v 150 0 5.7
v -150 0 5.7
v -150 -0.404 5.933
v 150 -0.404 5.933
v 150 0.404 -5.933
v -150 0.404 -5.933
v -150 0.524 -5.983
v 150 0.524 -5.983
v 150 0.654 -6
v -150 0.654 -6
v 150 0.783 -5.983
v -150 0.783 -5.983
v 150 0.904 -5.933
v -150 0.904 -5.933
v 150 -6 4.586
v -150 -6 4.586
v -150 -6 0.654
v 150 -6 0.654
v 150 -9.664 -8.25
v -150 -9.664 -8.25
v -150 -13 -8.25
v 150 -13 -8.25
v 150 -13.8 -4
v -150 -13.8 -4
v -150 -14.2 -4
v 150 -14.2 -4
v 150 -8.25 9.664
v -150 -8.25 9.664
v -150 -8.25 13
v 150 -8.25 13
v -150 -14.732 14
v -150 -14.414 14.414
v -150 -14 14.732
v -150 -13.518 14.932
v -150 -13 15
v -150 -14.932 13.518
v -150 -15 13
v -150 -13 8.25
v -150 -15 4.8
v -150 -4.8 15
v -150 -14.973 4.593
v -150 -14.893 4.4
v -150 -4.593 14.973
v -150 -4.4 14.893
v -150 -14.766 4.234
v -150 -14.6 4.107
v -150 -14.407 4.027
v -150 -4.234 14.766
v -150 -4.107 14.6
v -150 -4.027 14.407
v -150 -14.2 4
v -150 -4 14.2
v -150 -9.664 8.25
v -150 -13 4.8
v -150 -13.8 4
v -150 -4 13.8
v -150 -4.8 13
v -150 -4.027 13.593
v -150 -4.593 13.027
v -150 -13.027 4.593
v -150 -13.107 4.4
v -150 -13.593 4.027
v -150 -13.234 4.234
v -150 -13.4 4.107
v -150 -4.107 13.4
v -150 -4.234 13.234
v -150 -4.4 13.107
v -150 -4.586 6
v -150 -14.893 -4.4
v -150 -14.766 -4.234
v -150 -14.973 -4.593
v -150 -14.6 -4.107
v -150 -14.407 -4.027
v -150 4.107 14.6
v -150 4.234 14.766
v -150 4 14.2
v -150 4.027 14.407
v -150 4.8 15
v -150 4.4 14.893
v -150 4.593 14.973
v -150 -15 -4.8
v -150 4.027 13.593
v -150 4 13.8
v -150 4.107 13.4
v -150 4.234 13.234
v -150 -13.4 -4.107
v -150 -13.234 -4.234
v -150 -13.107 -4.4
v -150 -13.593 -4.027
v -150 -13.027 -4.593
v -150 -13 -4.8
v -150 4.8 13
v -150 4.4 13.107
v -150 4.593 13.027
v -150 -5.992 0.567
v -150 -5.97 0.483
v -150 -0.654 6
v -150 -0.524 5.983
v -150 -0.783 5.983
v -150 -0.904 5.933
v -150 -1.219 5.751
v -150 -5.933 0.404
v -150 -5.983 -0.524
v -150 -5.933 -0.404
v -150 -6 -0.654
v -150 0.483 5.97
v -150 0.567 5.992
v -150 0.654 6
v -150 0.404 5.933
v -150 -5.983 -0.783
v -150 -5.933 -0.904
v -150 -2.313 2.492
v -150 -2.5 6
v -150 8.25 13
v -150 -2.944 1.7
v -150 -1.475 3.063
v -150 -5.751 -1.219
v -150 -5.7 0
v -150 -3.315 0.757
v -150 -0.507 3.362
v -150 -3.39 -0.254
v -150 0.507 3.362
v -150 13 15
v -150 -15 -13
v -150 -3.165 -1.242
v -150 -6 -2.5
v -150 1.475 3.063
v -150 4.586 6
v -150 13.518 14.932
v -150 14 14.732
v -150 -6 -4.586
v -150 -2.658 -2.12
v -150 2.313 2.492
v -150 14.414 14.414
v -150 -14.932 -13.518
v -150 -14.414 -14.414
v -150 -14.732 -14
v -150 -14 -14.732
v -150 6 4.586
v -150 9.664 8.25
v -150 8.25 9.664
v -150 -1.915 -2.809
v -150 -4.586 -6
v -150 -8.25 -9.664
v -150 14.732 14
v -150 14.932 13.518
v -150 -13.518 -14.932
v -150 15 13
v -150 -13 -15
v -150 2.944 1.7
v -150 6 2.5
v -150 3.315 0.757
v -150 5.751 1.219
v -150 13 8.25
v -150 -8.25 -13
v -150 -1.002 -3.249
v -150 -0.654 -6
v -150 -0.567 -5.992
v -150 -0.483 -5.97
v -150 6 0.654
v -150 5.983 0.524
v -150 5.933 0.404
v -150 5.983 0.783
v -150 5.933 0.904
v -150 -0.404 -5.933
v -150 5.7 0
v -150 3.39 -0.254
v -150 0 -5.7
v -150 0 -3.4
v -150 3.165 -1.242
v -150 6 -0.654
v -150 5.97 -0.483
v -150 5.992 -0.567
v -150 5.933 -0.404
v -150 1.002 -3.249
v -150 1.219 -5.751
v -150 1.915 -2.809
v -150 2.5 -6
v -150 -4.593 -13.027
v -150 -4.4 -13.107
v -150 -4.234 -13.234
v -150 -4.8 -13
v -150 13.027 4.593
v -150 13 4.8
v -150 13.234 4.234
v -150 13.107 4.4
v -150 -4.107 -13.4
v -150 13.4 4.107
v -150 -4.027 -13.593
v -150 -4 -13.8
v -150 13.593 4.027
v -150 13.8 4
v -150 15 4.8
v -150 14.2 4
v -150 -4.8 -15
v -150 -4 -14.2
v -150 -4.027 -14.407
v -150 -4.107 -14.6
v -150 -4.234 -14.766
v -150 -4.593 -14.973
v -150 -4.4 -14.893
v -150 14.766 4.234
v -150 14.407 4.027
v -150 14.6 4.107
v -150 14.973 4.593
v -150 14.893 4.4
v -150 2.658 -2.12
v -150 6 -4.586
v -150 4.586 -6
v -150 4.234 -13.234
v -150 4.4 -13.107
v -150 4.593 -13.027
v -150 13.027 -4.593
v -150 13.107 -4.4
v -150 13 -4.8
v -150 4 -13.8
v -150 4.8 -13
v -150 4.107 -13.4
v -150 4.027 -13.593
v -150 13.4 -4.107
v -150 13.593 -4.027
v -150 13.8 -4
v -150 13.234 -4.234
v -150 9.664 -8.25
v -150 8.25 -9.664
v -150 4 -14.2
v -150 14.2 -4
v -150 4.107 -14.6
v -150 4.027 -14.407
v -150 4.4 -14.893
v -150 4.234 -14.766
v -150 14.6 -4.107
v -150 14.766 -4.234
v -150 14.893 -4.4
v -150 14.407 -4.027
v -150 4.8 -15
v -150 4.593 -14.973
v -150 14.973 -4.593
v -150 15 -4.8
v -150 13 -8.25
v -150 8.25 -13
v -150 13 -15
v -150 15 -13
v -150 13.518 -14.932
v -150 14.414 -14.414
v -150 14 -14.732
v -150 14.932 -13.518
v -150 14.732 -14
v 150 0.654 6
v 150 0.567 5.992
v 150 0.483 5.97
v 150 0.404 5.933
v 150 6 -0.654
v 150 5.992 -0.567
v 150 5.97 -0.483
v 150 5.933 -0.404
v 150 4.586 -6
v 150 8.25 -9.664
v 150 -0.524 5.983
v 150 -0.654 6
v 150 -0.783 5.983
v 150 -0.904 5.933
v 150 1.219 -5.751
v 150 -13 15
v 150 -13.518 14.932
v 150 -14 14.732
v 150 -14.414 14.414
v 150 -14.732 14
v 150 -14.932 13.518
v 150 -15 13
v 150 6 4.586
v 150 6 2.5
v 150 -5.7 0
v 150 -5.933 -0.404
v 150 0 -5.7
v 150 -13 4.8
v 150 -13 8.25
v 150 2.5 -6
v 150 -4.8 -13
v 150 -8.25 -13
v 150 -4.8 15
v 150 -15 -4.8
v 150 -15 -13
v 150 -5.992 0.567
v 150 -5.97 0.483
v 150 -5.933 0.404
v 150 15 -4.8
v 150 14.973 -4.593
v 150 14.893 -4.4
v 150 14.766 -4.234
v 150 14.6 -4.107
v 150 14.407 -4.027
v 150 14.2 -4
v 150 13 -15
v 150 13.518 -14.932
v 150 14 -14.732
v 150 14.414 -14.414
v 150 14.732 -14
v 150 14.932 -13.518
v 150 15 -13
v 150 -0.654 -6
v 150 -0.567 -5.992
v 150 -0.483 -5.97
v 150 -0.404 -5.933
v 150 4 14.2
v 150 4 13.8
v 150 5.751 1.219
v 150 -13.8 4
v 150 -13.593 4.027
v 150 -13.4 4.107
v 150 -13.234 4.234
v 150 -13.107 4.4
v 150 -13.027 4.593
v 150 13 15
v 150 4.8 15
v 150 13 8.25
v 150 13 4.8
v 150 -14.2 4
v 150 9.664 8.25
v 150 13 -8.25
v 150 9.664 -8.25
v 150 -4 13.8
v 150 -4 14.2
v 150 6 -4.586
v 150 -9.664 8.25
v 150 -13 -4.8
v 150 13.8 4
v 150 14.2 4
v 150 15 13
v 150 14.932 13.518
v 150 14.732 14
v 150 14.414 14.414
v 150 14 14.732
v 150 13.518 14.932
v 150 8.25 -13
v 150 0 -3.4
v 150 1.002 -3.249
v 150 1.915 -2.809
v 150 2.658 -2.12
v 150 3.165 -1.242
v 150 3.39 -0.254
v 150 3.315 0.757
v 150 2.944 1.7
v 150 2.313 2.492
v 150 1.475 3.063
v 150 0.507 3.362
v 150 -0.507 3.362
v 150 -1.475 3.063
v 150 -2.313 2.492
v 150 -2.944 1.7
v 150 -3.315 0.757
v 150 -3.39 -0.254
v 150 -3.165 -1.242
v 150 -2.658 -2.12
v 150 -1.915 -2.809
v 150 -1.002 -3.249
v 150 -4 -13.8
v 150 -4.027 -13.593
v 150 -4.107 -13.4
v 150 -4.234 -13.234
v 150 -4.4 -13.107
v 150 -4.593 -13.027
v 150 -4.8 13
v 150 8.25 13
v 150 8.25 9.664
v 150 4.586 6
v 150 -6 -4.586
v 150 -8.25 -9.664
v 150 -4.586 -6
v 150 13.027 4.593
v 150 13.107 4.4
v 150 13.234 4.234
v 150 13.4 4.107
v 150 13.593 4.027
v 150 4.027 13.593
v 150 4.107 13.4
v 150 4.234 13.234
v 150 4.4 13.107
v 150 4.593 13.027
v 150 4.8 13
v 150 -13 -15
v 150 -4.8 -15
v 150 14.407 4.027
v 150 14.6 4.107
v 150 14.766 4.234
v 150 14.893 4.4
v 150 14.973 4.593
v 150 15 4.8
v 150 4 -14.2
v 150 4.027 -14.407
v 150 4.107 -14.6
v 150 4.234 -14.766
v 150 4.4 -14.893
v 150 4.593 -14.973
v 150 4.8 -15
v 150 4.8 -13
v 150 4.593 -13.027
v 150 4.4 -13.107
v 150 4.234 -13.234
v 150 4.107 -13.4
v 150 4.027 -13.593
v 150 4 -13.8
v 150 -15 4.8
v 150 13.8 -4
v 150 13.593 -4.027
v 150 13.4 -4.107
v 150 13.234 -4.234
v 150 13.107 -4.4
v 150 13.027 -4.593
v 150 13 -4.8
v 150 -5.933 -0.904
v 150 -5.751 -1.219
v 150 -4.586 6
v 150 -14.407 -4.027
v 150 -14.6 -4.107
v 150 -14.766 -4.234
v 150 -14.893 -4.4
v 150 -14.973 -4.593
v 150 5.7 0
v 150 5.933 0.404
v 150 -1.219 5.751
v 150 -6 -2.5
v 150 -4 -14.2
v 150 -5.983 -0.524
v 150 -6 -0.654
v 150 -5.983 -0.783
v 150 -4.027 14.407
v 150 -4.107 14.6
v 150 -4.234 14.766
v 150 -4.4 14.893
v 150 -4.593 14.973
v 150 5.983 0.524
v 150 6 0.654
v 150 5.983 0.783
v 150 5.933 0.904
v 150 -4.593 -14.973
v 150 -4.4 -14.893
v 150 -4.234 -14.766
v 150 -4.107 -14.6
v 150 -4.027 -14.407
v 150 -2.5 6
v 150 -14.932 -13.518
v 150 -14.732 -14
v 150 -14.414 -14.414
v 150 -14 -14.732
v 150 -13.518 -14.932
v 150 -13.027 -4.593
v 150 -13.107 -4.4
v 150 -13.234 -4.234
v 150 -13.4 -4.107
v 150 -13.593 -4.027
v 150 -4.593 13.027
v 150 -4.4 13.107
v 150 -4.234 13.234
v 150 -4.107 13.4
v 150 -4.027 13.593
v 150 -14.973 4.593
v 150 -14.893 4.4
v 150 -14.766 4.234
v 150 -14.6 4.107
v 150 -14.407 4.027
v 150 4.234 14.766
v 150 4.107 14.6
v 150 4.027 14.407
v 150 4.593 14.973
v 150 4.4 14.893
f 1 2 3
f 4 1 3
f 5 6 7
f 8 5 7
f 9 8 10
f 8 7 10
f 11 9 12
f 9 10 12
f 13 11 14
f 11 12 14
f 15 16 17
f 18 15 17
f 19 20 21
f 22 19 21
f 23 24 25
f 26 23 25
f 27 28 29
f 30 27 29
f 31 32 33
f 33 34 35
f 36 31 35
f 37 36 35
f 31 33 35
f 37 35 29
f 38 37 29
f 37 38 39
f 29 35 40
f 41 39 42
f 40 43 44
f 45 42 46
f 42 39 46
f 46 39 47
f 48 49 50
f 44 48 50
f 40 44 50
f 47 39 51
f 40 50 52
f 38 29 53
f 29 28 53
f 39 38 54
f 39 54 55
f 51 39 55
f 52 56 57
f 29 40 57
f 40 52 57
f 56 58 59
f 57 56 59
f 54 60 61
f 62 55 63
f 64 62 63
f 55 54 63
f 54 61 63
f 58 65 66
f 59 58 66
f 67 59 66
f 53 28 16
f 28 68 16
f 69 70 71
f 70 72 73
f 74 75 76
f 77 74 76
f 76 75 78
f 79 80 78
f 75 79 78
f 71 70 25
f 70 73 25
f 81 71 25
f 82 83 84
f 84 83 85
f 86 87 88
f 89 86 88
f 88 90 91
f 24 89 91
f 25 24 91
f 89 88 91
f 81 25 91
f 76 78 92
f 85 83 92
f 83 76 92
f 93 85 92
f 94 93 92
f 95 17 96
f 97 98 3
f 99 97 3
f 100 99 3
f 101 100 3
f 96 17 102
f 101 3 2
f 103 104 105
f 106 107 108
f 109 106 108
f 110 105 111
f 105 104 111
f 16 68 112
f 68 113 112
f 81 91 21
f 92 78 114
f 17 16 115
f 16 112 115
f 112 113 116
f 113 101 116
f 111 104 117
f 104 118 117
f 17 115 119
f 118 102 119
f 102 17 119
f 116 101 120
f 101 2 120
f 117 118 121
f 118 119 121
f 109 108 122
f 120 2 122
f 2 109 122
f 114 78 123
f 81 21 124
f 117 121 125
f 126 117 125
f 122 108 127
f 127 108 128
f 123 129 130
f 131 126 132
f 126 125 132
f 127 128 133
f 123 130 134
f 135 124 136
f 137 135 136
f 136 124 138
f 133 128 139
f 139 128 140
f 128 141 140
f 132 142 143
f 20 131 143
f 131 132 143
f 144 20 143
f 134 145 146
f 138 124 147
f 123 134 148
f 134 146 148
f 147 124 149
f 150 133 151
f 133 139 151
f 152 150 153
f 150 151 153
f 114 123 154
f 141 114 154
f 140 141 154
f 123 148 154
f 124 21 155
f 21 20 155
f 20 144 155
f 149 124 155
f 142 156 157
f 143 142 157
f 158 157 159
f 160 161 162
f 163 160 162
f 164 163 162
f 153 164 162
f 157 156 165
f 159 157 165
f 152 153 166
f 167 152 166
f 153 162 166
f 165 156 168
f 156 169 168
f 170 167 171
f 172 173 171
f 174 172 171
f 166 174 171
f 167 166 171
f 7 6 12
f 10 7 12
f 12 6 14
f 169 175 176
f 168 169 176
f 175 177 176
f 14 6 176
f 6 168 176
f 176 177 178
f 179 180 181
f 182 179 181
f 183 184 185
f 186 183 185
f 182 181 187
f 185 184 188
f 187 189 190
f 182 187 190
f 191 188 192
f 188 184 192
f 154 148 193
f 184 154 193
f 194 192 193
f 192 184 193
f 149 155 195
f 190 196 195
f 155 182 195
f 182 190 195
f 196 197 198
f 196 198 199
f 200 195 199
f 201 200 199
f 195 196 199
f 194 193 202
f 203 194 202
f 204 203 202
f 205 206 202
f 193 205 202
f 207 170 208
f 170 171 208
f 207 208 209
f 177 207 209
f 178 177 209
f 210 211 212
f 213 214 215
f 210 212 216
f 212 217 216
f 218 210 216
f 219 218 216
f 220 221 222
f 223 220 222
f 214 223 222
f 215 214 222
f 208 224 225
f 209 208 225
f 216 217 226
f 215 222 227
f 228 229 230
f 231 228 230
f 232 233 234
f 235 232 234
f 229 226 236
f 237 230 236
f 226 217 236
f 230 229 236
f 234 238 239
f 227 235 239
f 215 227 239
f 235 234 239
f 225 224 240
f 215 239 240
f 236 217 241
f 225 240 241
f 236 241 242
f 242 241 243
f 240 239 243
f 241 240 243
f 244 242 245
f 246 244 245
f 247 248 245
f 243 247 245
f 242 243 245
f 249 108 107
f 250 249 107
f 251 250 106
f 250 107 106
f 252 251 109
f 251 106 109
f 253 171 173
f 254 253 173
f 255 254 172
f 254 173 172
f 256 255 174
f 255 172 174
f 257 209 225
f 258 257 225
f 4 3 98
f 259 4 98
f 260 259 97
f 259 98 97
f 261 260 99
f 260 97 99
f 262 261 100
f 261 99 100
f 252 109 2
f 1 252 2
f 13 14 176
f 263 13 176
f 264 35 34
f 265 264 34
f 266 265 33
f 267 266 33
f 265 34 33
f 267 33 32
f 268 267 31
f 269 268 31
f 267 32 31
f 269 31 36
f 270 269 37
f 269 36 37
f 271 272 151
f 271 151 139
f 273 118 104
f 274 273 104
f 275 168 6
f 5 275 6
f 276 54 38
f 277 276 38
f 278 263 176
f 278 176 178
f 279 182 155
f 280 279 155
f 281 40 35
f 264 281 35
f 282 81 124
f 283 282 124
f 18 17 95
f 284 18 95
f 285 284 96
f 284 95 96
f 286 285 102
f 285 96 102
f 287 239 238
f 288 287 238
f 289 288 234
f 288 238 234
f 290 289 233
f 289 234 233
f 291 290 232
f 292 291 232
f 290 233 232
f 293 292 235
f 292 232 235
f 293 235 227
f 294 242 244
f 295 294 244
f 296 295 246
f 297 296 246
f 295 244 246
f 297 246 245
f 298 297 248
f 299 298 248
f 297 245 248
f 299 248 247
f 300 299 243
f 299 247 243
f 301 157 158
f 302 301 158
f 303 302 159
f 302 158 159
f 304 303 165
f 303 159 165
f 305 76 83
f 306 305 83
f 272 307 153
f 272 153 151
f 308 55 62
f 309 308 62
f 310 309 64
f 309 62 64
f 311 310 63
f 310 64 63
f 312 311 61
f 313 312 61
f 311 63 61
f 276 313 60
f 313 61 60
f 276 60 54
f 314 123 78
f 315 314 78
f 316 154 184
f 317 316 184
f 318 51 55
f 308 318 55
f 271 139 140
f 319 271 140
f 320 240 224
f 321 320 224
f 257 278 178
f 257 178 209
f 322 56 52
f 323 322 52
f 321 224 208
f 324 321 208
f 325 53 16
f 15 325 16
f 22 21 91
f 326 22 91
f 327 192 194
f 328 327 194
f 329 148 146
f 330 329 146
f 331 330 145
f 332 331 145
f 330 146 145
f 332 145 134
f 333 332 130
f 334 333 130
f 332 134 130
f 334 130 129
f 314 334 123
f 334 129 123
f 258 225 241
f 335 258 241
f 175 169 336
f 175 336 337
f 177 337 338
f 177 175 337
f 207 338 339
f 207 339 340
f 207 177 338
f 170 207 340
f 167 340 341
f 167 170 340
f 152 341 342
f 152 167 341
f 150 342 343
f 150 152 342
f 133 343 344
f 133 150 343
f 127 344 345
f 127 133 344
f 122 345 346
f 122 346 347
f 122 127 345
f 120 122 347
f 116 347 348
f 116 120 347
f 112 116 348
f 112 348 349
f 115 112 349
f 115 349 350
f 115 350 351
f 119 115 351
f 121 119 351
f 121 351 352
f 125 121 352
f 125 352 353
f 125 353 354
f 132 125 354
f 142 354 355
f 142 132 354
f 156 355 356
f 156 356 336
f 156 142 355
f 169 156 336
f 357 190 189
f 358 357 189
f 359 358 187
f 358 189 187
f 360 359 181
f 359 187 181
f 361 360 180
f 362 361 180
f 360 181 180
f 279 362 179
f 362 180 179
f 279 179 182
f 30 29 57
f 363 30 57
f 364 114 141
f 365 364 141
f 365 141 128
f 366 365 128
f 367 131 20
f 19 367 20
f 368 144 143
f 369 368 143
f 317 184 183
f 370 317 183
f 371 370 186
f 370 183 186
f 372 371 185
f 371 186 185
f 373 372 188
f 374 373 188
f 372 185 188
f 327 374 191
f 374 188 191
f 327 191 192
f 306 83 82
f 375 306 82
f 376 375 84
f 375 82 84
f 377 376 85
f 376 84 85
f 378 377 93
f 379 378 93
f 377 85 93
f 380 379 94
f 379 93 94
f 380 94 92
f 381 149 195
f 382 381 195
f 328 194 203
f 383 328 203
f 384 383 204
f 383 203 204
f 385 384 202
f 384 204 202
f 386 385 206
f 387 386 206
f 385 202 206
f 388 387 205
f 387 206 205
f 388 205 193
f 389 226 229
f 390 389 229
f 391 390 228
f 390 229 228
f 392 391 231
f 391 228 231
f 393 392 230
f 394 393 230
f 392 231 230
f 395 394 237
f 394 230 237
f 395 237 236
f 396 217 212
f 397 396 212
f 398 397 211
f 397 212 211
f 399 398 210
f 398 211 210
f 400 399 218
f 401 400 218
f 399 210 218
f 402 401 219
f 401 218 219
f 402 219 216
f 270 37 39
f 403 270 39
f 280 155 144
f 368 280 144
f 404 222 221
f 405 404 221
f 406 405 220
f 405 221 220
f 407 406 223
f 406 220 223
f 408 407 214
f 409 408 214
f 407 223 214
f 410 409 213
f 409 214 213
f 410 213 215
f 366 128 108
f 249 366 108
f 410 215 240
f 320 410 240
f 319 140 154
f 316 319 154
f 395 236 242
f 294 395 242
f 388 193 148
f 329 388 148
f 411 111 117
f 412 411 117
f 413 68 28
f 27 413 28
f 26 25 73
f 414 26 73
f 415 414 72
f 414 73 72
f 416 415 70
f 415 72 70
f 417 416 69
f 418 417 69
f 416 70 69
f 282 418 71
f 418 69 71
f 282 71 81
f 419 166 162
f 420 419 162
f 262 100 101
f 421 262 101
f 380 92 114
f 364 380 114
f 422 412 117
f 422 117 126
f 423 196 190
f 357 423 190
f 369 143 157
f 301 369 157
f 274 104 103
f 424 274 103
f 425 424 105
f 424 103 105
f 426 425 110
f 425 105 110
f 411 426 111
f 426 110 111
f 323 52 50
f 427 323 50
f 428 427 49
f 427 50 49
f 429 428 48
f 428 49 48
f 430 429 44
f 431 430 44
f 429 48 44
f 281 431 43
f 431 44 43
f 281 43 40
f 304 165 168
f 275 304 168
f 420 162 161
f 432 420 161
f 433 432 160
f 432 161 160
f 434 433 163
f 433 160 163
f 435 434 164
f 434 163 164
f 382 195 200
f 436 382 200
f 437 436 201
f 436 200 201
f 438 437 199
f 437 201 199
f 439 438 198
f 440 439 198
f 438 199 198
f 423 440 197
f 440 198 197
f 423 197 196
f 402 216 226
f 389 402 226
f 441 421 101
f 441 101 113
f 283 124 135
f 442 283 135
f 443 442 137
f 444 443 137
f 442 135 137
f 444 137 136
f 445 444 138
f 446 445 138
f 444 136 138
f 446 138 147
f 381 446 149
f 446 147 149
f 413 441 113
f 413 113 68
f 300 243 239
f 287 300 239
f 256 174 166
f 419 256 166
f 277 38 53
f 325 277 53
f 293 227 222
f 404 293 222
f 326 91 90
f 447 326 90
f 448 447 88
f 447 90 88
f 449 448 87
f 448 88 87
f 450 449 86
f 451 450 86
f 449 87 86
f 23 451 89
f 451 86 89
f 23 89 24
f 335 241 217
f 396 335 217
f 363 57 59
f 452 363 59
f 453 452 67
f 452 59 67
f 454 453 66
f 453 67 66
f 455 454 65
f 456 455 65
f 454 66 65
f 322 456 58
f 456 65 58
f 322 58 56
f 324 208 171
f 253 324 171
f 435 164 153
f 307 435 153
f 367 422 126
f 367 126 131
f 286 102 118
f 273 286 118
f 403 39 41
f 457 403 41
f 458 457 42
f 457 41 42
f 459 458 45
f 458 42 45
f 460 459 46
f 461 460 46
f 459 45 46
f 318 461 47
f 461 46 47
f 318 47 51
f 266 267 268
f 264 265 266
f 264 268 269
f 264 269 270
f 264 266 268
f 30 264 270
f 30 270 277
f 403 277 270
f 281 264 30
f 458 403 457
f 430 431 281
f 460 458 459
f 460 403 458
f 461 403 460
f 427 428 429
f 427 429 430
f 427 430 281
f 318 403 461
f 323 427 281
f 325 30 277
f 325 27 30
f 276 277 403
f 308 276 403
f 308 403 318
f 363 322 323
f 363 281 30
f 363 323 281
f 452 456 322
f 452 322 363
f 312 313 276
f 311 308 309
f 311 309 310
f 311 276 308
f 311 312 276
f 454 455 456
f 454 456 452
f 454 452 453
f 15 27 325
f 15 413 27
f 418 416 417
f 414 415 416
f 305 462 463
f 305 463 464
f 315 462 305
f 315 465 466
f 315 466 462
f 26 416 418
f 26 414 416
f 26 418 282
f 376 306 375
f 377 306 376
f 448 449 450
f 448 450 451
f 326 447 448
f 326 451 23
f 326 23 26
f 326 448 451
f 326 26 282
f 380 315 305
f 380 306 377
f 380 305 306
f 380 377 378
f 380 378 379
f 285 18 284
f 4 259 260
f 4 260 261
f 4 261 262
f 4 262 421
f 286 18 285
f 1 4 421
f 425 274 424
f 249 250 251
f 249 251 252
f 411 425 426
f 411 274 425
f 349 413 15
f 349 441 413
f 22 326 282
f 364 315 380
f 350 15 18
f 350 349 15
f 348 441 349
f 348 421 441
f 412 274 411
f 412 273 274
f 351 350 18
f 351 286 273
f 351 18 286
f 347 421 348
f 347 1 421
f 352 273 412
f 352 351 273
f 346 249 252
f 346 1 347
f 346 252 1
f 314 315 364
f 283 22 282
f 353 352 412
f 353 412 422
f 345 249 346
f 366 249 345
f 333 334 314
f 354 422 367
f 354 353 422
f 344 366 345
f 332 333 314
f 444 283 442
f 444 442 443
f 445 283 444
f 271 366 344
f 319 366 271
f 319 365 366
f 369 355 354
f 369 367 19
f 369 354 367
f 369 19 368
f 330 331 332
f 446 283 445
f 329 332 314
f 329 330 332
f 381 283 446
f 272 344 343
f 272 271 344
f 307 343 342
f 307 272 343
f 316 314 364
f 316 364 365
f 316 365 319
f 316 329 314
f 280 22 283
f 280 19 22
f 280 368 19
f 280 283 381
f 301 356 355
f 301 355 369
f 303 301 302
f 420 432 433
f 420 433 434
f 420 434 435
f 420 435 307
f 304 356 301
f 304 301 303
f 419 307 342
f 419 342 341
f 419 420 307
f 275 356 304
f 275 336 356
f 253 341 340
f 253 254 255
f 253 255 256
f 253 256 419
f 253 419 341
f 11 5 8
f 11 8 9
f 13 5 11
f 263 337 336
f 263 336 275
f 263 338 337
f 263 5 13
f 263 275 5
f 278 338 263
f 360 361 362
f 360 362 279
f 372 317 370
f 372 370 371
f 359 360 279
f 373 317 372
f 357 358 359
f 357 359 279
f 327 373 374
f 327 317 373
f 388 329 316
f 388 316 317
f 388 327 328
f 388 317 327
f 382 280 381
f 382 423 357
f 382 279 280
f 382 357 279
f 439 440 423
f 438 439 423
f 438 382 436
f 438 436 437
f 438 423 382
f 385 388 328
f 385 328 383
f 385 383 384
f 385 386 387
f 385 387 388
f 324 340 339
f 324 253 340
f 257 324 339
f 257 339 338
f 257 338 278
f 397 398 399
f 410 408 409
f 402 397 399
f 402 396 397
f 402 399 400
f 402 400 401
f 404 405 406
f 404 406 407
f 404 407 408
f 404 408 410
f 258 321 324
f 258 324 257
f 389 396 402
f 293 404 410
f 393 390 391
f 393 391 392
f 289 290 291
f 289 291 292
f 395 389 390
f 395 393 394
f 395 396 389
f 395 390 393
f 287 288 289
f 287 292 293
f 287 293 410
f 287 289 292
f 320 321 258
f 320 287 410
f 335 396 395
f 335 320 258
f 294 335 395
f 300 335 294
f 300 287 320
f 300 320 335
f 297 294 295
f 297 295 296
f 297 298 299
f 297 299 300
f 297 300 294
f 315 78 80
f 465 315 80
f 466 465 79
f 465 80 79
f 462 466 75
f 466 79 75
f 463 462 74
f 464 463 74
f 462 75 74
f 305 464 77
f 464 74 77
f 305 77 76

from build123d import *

# Parameters (mm, degrees)
SKETCH_1_R             = 3.4
F_30_X_30_X_R2_2_DEPTH = 300


with BuildPart() as part:
    # 草图1 → 铝型材 30 X 30 X R2(2) (new body)
    with BuildSketch(Plane(origin=(-150, 0, 0), x_dir=(0, 0, -1), z_dir=(1, 0, 0))):
        with BuildLine():
            Line((-15, -4.8), (-15, -13))
            ThreePointArc((-15, -13), (-14.414213562, -14.414213562), (-13, -15))
            Line((-13, -15), (-4.8, -15))
            ThreePointArc((-4.8, -15), (-4.234314575, -14.765685425), (-4, -14.2))
            Line((-4, -14.2), (-4, -13.8))
            ThreePointArc((-4, -13.8), (-4.234314575, -13.234314575), (-4.8, -13))
            Line((-4.8, -13), (-8.25, -13))
            Line((-8.25, -13), (-8.25, -9.664213562))
            Line((-8.25, -9.664213562), (-4.585786438, -6))
            Line((-4.585786438, -6), (-0.653589838, -6))
            ThreePointArc((-0.653589838, -6), (-0.524180316, -5.982962913), (-0.403589838, -5.933012702))
            Line((-0.403589838, -5.933012702), (0, -5.7))
            Line((0, -5.7), (0.403589838, -5.933012702))
            ThreePointArc((0.403589838, -5.933012702), (0.653589838, -6), (0.903589838, -5.933012702))
            Line((0.903589838, -5.933012702), (1.218885629, -5.750976592))
            Line((1.218885629, -5.750976592), (2.5, -6))
            Line((2.5, -6), (4.585786438, -6))
            Line((4.585786438, -6), (8.25, -9.664213562))
            Line((8.25, -9.664213562), (8.25, -13))
            Line((8.25, -13), (4.8, -13))
            ThreePointArc((4.8, -13), (4.234314575, -13.234314575), (4, -13.8))
            Line((4, -13.8), (4, -14.2))
            ThreePointArc((4, -14.2), (4.234314575, -14.765685425), (4.8, -15))
            Line((4.8, -15), (13, -15))
            ThreePointArc((13, -15), (14.414213562, -14.414213562), (15, -13))
            Line((15, -13), (15, -4.8))
            ThreePointArc((15, -4.8), (14.765685425, -4.234314575), (14.2, -4))
            Line((14.2, -4), (13.8, -4))
            ThreePointArc((13.8, -4), (13.234314575, -4.234314575), (13, -4.8))
            Line((13, -4.8), (13, -8.25))
            Line((13, -8.25), (9.664213562, -8.25))
            Line((9.664213562, -8.25), (6, -4.585786438))
            Line((6, -4.585786438), (6, -0.653589838))
            ThreePointArc((6, -0.653589838), (5.982962913, -0.524180316), (5.933012702, -0.403589838))
            Line((5.933012702, -0.403589838), (5.7, 0))
            Line((5.7, 0), (5.933012702, 0.403589838))
            ThreePointArc((5.933012702, 0.403589838), (6, 0.653589838), (5.933012702, 0.903589838))
            Line((5.933012702, 0.903589838), (5.750976592, 1.218885629))
            Line((5.750976592, 1.218885629), (6, 2.5))
            Line((6, 2.5), (6, 4.585786438))
            Line((6, 4.585786438), (9.664213562, 8.25))
            Line((9.664213562, 8.25), (13, 8.25))
            Line((13, 8.25), (13, 4.8))
            ThreePointArc((13, 4.8), (13.234314575, 4.234314575), (13.8, 4))
            Line((13.8, 4), (14.2, 4))
            ThreePointArc((14.2, 4), (14.765685425, 4.234314575), (15, 4.8))
            Line((15, 4.8), (15, 13))
            ThreePointArc((15, 13), (14.414213562, 14.414213562), (13, 15))
            Line((13, 15), (4.8, 15))
            ThreePointArc((4.8, 15), (4.234314575, 14.765685425), (4, 14.2))
            Line((4, 14.2), (4, 13.8))
            ThreePointArc((4, 13.8), (4.234314575, 13.234314575), (4.8, 13))
            Line((4.8, 13), (8.25, 13))
            Line((8.25, 13), (8.25, 9.664213562))
            Line((8.25, 9.664213562), (4.585786438, 6))
            Line((4.585786438, 6), (0.653589838, 6))
            ThreePointArc((0.653589838, 6), (0.524180316, 5.982962913), (0.403589838, 5.933012702))
            Line((0.403589838, 5.933012702), (0, 5.7))
            Line((0, 5.7), (-0.403589838, 5.933012702))
            ThreePointArc((-0.403589838, 5.933012702), (-0.653589838, 6), (-0.903589838, 5.933012702))
            Line((-0.903589838, 5.933012702), (-1.218885629, 5.750976592))
            Line((-1.218885629, 5.750976592), (-2.5, 6))
            Line((-2.5, 6), (-4.585786438, 6))
            Line((-4.585786438, 6), (-8.25, 9.664213562))
            Line((-8.25, 9.664213562), (-8.25, 13))
            Line((-8.25, 13), (-4.8, 13))
            ThreePointArc((-4.8, 13), (-4.234314575, 13.234314575), (-4, 13.8))
            Line((-4, 13.8), (-4, 14.2))
            ThreePointArc((-4, 14.2), (-4.234314575, 14.765685425), (-4.8, 15))
            Line((-4.8, 15), (-13, 15))
            ThreePointArc((-13, 15), (-14.414213562, 14.414213562), (-15, 13))
            Line((-15, 13), (-15, 4.8))
            ThreePointArc((-15, 4.8), (-14.765685425, 4.234314575), (-14.2, 4))
            Line((-14.2, 4), (-13.8, 4))
            ThreePointArc((-13.8, 4), (-13.234314575, 4.234314575), (-13, 4.8))
            Line((-13, 4.8), (-13, 8.25))
            Line((-13, 8.25), (-9.664213562, 8.25))
            Line((-9.664213562, 8.25), (-6, 4.585786438))
            Line((-6, 4.585786438), (-6, 0.653589838))
            ThreePointArc((-6, 0.653589838), (-5.982962913, 0.524180316), (-5.933012702, 0.403589838))
            Line((-5.933012702, 0.403589838), (-5.7, 0))
            Line((-5.7, 0), (-5.933012702, -0.403589838))
            ThreePointArc((-5.933012702, -0.403589838), (-6, -0.653589838), (-5.933012702, -0.903589838))
            Line((-5.933012702, -0.903589838), (-5.750976592, -1.218885629))
            Line((-5.750976592, -1.218885629), (-6, -2.5))
            Line((-6, -2.5), (-6, -4.585786438))
            Line((-6, -4.585786438), (-9.664213562, -8.25))
            Line((-9.664213562, -8.25), (-13, -8.25))
            Line((-13, -8.25), (-13, -4.8))
            ThreePointArc((-13, -4.8), (-13.234314575, -4.234314575), (-13.8, -4))
            Line((-13.8, -4), (-14.2, -4))
            ThreePointArc((-14.2, -4), (-14.765685425, -4.234314575), (-15, -4.8))
        make_face()
        Circle(SKETCH_1_R, mode=Mode.SUBTRACT)
    extrude(amount=F_30_X_30_X_R2_2_DEPTH)


solid = part.part
